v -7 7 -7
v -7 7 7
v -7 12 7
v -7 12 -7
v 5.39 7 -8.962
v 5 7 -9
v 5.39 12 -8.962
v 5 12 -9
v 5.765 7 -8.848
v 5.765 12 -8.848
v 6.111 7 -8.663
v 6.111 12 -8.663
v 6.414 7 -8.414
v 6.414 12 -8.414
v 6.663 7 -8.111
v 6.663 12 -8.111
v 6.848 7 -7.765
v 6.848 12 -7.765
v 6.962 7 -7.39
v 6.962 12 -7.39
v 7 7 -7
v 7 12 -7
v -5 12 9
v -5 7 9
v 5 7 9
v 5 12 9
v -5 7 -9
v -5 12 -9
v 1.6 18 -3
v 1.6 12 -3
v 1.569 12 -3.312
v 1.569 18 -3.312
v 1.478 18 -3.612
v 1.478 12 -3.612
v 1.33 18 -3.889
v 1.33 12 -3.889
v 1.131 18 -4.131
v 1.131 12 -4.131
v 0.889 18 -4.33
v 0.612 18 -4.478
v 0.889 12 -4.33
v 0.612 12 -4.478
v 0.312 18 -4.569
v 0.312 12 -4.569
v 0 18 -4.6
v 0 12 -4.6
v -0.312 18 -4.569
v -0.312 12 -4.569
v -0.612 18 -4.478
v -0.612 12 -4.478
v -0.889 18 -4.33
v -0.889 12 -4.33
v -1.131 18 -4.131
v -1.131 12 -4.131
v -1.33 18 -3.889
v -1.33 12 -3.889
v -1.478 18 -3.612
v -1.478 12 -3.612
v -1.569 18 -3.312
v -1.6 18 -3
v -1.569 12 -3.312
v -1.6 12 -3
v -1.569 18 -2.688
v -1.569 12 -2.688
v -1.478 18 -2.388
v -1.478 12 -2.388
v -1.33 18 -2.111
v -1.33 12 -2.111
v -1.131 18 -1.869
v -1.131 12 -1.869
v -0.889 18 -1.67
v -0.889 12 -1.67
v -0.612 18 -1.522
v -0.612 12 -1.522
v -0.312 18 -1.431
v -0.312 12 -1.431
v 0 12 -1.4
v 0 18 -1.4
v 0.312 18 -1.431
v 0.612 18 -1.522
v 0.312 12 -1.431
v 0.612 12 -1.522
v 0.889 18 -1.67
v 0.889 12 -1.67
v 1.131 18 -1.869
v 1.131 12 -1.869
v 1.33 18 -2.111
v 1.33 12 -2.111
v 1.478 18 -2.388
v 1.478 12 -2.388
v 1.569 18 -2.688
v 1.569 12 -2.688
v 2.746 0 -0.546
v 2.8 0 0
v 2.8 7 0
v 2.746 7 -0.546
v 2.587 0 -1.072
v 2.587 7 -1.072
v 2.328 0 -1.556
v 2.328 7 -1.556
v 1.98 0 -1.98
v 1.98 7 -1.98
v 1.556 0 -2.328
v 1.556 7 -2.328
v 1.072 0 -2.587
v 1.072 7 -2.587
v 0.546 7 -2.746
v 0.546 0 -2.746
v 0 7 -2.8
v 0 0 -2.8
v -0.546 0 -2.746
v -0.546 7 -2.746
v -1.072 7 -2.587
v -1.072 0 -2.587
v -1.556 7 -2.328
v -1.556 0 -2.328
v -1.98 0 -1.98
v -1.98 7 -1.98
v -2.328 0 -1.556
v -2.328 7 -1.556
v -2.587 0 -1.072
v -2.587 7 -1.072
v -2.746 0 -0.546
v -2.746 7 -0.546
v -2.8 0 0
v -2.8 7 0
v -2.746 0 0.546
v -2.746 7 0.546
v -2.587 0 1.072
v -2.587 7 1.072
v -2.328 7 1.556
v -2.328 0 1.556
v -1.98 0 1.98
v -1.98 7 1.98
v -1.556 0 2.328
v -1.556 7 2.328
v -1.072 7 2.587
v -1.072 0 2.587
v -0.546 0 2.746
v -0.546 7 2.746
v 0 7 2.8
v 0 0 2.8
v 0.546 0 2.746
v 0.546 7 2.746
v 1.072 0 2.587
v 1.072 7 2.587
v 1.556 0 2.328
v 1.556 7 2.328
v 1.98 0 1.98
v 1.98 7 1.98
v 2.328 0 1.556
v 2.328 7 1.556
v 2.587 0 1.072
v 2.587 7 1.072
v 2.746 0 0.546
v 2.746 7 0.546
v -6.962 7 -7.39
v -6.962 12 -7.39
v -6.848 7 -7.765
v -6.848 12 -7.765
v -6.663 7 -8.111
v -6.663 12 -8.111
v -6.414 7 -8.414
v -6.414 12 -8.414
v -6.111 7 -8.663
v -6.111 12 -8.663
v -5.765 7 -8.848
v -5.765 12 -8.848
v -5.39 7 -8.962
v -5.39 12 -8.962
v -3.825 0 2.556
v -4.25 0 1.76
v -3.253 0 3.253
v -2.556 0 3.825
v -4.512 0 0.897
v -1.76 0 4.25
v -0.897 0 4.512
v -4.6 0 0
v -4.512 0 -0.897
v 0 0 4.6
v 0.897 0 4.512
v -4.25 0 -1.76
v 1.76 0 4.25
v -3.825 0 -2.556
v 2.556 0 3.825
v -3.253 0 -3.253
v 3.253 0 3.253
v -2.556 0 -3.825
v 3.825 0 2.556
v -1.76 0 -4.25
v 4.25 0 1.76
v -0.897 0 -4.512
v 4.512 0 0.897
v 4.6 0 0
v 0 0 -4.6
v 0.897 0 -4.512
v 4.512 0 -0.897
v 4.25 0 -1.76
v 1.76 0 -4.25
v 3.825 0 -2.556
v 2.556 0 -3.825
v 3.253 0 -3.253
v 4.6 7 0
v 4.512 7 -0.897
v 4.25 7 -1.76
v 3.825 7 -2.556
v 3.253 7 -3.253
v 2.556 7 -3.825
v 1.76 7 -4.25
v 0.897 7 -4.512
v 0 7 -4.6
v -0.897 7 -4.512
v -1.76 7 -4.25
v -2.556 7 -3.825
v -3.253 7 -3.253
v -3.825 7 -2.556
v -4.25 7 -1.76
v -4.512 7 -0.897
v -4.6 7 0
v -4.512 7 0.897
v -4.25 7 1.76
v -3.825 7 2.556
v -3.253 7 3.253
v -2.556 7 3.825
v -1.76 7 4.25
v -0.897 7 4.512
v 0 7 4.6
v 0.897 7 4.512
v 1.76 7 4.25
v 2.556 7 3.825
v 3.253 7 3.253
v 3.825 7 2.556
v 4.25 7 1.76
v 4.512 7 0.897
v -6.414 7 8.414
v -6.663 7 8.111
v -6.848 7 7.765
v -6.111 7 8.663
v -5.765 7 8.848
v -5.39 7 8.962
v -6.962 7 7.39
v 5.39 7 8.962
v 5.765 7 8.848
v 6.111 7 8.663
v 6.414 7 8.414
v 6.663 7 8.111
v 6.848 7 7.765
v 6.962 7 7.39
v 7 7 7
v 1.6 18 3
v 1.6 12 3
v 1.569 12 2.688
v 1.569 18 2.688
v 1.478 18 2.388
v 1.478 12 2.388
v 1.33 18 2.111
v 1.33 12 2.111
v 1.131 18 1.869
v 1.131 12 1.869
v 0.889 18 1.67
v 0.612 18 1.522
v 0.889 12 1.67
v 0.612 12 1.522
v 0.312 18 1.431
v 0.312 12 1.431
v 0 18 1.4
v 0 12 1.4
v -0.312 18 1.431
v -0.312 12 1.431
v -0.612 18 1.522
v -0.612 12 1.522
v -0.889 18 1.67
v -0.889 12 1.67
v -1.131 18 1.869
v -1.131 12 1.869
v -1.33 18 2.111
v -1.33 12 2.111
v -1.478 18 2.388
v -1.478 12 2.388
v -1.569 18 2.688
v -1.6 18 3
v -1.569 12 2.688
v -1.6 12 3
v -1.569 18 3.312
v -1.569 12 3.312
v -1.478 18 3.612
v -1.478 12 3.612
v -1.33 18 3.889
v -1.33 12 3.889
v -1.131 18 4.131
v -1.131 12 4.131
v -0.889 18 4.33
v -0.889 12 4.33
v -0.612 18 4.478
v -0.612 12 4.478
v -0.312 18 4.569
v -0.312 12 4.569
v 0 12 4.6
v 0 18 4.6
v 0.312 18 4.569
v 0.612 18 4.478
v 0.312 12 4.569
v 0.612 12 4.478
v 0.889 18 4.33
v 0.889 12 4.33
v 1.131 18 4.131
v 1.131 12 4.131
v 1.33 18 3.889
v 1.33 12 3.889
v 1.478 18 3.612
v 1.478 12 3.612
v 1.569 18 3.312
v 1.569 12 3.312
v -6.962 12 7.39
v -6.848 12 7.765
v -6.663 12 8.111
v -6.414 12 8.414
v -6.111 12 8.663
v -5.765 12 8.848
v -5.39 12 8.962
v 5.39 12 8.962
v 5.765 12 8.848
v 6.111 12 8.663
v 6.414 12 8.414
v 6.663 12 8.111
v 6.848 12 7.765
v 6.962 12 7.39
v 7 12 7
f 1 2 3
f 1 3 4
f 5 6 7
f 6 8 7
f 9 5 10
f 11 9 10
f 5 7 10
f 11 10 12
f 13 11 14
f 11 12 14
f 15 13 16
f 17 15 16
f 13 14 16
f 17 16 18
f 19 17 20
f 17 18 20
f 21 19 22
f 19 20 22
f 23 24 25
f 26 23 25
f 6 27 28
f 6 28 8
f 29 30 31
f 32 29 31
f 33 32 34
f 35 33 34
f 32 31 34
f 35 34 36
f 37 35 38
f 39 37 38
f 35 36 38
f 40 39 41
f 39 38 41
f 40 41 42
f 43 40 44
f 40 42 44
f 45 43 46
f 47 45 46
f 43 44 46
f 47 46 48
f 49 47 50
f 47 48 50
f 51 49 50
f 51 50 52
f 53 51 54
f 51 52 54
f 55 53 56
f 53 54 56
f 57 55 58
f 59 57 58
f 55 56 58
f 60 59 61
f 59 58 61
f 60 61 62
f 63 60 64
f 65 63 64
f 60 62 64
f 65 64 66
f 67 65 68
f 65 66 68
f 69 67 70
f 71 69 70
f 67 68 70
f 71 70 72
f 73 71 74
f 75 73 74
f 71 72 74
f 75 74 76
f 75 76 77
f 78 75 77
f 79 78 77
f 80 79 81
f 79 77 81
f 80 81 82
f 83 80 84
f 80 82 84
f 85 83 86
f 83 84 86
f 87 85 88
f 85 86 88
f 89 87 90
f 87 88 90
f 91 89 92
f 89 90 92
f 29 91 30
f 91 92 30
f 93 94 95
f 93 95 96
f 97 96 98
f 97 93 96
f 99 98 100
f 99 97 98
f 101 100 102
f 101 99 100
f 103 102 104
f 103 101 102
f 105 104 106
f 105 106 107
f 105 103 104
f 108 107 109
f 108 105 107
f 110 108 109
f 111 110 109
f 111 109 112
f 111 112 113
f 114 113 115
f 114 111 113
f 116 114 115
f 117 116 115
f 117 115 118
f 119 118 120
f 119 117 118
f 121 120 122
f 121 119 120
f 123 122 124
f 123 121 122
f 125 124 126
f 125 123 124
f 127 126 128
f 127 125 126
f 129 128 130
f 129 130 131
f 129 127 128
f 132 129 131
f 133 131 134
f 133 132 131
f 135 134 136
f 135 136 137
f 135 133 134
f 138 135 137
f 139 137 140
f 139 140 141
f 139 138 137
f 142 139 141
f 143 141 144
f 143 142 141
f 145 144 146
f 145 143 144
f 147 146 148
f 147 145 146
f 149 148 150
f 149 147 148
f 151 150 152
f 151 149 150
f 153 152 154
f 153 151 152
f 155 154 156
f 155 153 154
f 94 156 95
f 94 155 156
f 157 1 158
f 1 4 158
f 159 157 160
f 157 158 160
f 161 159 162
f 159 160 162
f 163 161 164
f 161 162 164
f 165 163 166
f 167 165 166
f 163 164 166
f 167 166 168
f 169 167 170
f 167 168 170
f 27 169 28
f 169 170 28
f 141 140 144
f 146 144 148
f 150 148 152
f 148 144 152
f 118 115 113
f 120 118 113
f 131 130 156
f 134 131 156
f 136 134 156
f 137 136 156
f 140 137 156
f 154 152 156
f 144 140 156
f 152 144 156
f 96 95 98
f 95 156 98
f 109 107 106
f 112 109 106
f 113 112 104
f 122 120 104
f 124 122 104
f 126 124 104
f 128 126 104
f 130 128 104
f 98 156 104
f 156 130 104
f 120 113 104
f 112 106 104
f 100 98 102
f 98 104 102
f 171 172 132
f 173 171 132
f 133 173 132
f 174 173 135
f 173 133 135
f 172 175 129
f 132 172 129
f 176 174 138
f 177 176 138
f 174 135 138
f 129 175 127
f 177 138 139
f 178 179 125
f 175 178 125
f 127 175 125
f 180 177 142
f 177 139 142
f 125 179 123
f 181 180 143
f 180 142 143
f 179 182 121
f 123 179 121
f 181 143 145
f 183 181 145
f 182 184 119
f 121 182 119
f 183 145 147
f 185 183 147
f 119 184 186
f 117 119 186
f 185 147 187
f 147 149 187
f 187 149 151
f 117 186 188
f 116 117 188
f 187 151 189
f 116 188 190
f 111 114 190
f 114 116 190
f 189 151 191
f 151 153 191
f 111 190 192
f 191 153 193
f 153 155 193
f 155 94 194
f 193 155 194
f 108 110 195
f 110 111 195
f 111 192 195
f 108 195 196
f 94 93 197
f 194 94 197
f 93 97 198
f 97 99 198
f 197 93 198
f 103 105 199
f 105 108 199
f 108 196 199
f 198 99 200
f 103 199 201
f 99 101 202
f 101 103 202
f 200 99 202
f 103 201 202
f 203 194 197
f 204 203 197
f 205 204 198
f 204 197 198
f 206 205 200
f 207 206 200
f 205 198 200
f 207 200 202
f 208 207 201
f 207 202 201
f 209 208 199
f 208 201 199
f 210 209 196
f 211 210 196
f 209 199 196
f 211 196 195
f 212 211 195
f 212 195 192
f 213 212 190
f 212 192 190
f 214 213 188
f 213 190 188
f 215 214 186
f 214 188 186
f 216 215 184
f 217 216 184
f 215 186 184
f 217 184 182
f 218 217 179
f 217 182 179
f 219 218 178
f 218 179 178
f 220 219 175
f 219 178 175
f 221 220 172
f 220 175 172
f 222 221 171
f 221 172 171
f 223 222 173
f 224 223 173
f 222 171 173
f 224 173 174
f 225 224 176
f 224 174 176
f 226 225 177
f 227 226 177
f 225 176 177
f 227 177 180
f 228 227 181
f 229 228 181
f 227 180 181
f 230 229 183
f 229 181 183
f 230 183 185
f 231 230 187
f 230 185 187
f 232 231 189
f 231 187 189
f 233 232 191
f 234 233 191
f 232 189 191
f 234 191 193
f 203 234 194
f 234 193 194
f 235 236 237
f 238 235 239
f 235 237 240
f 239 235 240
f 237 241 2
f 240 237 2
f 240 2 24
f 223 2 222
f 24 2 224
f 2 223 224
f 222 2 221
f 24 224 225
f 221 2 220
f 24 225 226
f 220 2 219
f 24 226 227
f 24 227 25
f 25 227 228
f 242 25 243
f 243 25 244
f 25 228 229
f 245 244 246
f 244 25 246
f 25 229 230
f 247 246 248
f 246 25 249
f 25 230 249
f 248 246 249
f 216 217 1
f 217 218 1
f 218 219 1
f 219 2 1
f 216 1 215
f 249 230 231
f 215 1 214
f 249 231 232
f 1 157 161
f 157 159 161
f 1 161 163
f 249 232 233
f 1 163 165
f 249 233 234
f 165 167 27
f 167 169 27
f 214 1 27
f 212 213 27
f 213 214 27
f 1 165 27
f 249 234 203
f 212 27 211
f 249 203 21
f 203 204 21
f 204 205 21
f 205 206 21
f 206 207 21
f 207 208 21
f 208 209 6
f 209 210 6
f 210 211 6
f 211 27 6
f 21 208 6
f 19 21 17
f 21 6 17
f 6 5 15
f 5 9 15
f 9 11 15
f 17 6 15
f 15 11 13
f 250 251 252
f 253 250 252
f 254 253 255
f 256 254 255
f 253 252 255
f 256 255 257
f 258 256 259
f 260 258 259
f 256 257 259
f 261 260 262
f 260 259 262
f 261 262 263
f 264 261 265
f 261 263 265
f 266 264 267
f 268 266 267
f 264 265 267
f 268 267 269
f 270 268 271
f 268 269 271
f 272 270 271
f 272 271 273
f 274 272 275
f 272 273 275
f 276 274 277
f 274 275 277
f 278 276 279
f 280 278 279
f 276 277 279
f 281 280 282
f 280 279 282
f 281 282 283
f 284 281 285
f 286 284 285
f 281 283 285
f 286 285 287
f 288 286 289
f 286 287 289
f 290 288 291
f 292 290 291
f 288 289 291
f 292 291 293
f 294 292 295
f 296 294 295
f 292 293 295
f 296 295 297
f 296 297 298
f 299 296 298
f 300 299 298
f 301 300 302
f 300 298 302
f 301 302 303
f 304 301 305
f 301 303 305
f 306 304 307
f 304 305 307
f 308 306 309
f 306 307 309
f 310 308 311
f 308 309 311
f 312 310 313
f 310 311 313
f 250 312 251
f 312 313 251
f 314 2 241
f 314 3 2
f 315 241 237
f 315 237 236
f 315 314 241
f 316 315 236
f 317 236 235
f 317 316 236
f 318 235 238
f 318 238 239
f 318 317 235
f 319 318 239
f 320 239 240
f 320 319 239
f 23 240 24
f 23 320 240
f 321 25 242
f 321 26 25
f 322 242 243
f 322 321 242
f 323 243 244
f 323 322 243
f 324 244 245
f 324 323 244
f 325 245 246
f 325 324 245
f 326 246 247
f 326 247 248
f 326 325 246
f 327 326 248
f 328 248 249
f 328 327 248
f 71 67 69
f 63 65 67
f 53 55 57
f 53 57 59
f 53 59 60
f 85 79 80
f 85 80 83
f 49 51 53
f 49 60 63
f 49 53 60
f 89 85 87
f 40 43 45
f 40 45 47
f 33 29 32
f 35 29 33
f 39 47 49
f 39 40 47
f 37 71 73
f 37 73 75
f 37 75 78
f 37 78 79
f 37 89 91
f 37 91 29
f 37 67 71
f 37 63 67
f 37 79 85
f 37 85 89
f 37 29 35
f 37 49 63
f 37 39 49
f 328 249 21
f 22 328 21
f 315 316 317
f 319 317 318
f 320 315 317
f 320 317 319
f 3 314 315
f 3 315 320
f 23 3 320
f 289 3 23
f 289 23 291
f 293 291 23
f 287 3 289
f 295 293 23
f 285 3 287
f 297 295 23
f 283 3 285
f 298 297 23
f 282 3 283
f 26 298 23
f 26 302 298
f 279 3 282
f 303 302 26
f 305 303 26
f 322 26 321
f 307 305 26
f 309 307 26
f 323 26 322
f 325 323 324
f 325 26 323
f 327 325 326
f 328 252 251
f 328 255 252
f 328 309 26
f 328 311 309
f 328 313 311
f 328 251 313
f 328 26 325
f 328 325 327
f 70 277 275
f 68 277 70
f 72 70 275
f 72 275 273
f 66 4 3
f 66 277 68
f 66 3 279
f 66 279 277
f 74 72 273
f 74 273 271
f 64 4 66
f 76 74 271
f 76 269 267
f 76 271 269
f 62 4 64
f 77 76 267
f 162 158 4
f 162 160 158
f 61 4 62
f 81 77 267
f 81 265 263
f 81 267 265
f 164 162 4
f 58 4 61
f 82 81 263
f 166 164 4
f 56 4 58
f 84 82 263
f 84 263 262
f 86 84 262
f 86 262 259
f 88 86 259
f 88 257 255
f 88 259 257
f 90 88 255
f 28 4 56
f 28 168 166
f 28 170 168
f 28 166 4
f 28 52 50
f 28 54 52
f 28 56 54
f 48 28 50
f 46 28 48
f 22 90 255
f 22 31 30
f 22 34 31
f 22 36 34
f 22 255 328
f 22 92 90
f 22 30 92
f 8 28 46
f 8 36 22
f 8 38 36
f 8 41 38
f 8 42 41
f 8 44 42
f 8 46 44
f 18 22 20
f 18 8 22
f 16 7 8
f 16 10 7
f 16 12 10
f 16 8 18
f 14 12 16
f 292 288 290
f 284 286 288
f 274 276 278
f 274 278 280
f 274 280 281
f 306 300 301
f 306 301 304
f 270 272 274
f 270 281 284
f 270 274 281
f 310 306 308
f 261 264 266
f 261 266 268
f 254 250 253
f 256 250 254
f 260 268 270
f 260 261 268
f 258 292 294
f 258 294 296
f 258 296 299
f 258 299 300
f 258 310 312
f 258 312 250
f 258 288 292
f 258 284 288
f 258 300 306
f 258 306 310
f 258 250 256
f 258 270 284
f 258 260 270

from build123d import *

# Parameters (mm, degrees)
SKETCH1_R           = 4.6
SKETCH1_R_2         = 2.8
BOSS_EXTRUDE1_DEPTH = 7
BOSS_EXTRUDE2_START = 7
SKETCH1_3_W         = 14
SKETCH1_3_H         = 18
BOSS_EXTRUDE2_DEPTH = 5
SKETCH2_R           = 1.6
BOSS_EXTRUDE3_DEPTH = 6
FILLET1_R           = 2


with BuildPart() as part:
    # Sketch1 → Boss-Extrude1 (new body)
    with BuildSketch(Plane(origin=(0, 0, 0), x_dir=(1, 0, 0), z_dir=(0, 1, 0))):
        Circle(SKETCH1_R)
        Circle(SKETCH1_R_2, mode=Mode.SUBTRACT)
    extrude(amount=BOSS_EXTRUDE1_DEPTH)

    # Sketch1<3> → Boss-Extrude2 (add)
    with BuildSketch(Plane(origin=(0, 0, 0), x_dir=(1, 0, 0), z_dir=(0, 1, 0)).offset(BOSS_EXTRUDE2_START)):
        Rectangle(SKETCH1_3_W, SKETCH1_3_H)
    extrude(amount=BOSS_EXTRUDE2_DEPTH)

    # Sketch2 → Boss-Extrude3 (add)
    with BuildSketch(Plane(origin=(0, 12, 0), x_dir=(1, 0, 0), z_dir=(0, 1, 0))):
        with Locations((0, 3)):
            Circle(SKETCH2_R)
        with Locations((0, -3)):
            Circle(SKETCH2_R)
    extrude(amount=BOSS_EXTRUDE3_DEPTH)

    # Fillet1
    fillet1_edges = [part.edges().sort_by_distance(p)[0] for p in [
        (7, 9.5, 9),
        (-7, 9.5, 9),
        (-7, 9.5, -9),
        (7, 9.5, -9),
    ]]
    fillet(fillet1_edges, radius=FILLET1_R)


solid = part.part
